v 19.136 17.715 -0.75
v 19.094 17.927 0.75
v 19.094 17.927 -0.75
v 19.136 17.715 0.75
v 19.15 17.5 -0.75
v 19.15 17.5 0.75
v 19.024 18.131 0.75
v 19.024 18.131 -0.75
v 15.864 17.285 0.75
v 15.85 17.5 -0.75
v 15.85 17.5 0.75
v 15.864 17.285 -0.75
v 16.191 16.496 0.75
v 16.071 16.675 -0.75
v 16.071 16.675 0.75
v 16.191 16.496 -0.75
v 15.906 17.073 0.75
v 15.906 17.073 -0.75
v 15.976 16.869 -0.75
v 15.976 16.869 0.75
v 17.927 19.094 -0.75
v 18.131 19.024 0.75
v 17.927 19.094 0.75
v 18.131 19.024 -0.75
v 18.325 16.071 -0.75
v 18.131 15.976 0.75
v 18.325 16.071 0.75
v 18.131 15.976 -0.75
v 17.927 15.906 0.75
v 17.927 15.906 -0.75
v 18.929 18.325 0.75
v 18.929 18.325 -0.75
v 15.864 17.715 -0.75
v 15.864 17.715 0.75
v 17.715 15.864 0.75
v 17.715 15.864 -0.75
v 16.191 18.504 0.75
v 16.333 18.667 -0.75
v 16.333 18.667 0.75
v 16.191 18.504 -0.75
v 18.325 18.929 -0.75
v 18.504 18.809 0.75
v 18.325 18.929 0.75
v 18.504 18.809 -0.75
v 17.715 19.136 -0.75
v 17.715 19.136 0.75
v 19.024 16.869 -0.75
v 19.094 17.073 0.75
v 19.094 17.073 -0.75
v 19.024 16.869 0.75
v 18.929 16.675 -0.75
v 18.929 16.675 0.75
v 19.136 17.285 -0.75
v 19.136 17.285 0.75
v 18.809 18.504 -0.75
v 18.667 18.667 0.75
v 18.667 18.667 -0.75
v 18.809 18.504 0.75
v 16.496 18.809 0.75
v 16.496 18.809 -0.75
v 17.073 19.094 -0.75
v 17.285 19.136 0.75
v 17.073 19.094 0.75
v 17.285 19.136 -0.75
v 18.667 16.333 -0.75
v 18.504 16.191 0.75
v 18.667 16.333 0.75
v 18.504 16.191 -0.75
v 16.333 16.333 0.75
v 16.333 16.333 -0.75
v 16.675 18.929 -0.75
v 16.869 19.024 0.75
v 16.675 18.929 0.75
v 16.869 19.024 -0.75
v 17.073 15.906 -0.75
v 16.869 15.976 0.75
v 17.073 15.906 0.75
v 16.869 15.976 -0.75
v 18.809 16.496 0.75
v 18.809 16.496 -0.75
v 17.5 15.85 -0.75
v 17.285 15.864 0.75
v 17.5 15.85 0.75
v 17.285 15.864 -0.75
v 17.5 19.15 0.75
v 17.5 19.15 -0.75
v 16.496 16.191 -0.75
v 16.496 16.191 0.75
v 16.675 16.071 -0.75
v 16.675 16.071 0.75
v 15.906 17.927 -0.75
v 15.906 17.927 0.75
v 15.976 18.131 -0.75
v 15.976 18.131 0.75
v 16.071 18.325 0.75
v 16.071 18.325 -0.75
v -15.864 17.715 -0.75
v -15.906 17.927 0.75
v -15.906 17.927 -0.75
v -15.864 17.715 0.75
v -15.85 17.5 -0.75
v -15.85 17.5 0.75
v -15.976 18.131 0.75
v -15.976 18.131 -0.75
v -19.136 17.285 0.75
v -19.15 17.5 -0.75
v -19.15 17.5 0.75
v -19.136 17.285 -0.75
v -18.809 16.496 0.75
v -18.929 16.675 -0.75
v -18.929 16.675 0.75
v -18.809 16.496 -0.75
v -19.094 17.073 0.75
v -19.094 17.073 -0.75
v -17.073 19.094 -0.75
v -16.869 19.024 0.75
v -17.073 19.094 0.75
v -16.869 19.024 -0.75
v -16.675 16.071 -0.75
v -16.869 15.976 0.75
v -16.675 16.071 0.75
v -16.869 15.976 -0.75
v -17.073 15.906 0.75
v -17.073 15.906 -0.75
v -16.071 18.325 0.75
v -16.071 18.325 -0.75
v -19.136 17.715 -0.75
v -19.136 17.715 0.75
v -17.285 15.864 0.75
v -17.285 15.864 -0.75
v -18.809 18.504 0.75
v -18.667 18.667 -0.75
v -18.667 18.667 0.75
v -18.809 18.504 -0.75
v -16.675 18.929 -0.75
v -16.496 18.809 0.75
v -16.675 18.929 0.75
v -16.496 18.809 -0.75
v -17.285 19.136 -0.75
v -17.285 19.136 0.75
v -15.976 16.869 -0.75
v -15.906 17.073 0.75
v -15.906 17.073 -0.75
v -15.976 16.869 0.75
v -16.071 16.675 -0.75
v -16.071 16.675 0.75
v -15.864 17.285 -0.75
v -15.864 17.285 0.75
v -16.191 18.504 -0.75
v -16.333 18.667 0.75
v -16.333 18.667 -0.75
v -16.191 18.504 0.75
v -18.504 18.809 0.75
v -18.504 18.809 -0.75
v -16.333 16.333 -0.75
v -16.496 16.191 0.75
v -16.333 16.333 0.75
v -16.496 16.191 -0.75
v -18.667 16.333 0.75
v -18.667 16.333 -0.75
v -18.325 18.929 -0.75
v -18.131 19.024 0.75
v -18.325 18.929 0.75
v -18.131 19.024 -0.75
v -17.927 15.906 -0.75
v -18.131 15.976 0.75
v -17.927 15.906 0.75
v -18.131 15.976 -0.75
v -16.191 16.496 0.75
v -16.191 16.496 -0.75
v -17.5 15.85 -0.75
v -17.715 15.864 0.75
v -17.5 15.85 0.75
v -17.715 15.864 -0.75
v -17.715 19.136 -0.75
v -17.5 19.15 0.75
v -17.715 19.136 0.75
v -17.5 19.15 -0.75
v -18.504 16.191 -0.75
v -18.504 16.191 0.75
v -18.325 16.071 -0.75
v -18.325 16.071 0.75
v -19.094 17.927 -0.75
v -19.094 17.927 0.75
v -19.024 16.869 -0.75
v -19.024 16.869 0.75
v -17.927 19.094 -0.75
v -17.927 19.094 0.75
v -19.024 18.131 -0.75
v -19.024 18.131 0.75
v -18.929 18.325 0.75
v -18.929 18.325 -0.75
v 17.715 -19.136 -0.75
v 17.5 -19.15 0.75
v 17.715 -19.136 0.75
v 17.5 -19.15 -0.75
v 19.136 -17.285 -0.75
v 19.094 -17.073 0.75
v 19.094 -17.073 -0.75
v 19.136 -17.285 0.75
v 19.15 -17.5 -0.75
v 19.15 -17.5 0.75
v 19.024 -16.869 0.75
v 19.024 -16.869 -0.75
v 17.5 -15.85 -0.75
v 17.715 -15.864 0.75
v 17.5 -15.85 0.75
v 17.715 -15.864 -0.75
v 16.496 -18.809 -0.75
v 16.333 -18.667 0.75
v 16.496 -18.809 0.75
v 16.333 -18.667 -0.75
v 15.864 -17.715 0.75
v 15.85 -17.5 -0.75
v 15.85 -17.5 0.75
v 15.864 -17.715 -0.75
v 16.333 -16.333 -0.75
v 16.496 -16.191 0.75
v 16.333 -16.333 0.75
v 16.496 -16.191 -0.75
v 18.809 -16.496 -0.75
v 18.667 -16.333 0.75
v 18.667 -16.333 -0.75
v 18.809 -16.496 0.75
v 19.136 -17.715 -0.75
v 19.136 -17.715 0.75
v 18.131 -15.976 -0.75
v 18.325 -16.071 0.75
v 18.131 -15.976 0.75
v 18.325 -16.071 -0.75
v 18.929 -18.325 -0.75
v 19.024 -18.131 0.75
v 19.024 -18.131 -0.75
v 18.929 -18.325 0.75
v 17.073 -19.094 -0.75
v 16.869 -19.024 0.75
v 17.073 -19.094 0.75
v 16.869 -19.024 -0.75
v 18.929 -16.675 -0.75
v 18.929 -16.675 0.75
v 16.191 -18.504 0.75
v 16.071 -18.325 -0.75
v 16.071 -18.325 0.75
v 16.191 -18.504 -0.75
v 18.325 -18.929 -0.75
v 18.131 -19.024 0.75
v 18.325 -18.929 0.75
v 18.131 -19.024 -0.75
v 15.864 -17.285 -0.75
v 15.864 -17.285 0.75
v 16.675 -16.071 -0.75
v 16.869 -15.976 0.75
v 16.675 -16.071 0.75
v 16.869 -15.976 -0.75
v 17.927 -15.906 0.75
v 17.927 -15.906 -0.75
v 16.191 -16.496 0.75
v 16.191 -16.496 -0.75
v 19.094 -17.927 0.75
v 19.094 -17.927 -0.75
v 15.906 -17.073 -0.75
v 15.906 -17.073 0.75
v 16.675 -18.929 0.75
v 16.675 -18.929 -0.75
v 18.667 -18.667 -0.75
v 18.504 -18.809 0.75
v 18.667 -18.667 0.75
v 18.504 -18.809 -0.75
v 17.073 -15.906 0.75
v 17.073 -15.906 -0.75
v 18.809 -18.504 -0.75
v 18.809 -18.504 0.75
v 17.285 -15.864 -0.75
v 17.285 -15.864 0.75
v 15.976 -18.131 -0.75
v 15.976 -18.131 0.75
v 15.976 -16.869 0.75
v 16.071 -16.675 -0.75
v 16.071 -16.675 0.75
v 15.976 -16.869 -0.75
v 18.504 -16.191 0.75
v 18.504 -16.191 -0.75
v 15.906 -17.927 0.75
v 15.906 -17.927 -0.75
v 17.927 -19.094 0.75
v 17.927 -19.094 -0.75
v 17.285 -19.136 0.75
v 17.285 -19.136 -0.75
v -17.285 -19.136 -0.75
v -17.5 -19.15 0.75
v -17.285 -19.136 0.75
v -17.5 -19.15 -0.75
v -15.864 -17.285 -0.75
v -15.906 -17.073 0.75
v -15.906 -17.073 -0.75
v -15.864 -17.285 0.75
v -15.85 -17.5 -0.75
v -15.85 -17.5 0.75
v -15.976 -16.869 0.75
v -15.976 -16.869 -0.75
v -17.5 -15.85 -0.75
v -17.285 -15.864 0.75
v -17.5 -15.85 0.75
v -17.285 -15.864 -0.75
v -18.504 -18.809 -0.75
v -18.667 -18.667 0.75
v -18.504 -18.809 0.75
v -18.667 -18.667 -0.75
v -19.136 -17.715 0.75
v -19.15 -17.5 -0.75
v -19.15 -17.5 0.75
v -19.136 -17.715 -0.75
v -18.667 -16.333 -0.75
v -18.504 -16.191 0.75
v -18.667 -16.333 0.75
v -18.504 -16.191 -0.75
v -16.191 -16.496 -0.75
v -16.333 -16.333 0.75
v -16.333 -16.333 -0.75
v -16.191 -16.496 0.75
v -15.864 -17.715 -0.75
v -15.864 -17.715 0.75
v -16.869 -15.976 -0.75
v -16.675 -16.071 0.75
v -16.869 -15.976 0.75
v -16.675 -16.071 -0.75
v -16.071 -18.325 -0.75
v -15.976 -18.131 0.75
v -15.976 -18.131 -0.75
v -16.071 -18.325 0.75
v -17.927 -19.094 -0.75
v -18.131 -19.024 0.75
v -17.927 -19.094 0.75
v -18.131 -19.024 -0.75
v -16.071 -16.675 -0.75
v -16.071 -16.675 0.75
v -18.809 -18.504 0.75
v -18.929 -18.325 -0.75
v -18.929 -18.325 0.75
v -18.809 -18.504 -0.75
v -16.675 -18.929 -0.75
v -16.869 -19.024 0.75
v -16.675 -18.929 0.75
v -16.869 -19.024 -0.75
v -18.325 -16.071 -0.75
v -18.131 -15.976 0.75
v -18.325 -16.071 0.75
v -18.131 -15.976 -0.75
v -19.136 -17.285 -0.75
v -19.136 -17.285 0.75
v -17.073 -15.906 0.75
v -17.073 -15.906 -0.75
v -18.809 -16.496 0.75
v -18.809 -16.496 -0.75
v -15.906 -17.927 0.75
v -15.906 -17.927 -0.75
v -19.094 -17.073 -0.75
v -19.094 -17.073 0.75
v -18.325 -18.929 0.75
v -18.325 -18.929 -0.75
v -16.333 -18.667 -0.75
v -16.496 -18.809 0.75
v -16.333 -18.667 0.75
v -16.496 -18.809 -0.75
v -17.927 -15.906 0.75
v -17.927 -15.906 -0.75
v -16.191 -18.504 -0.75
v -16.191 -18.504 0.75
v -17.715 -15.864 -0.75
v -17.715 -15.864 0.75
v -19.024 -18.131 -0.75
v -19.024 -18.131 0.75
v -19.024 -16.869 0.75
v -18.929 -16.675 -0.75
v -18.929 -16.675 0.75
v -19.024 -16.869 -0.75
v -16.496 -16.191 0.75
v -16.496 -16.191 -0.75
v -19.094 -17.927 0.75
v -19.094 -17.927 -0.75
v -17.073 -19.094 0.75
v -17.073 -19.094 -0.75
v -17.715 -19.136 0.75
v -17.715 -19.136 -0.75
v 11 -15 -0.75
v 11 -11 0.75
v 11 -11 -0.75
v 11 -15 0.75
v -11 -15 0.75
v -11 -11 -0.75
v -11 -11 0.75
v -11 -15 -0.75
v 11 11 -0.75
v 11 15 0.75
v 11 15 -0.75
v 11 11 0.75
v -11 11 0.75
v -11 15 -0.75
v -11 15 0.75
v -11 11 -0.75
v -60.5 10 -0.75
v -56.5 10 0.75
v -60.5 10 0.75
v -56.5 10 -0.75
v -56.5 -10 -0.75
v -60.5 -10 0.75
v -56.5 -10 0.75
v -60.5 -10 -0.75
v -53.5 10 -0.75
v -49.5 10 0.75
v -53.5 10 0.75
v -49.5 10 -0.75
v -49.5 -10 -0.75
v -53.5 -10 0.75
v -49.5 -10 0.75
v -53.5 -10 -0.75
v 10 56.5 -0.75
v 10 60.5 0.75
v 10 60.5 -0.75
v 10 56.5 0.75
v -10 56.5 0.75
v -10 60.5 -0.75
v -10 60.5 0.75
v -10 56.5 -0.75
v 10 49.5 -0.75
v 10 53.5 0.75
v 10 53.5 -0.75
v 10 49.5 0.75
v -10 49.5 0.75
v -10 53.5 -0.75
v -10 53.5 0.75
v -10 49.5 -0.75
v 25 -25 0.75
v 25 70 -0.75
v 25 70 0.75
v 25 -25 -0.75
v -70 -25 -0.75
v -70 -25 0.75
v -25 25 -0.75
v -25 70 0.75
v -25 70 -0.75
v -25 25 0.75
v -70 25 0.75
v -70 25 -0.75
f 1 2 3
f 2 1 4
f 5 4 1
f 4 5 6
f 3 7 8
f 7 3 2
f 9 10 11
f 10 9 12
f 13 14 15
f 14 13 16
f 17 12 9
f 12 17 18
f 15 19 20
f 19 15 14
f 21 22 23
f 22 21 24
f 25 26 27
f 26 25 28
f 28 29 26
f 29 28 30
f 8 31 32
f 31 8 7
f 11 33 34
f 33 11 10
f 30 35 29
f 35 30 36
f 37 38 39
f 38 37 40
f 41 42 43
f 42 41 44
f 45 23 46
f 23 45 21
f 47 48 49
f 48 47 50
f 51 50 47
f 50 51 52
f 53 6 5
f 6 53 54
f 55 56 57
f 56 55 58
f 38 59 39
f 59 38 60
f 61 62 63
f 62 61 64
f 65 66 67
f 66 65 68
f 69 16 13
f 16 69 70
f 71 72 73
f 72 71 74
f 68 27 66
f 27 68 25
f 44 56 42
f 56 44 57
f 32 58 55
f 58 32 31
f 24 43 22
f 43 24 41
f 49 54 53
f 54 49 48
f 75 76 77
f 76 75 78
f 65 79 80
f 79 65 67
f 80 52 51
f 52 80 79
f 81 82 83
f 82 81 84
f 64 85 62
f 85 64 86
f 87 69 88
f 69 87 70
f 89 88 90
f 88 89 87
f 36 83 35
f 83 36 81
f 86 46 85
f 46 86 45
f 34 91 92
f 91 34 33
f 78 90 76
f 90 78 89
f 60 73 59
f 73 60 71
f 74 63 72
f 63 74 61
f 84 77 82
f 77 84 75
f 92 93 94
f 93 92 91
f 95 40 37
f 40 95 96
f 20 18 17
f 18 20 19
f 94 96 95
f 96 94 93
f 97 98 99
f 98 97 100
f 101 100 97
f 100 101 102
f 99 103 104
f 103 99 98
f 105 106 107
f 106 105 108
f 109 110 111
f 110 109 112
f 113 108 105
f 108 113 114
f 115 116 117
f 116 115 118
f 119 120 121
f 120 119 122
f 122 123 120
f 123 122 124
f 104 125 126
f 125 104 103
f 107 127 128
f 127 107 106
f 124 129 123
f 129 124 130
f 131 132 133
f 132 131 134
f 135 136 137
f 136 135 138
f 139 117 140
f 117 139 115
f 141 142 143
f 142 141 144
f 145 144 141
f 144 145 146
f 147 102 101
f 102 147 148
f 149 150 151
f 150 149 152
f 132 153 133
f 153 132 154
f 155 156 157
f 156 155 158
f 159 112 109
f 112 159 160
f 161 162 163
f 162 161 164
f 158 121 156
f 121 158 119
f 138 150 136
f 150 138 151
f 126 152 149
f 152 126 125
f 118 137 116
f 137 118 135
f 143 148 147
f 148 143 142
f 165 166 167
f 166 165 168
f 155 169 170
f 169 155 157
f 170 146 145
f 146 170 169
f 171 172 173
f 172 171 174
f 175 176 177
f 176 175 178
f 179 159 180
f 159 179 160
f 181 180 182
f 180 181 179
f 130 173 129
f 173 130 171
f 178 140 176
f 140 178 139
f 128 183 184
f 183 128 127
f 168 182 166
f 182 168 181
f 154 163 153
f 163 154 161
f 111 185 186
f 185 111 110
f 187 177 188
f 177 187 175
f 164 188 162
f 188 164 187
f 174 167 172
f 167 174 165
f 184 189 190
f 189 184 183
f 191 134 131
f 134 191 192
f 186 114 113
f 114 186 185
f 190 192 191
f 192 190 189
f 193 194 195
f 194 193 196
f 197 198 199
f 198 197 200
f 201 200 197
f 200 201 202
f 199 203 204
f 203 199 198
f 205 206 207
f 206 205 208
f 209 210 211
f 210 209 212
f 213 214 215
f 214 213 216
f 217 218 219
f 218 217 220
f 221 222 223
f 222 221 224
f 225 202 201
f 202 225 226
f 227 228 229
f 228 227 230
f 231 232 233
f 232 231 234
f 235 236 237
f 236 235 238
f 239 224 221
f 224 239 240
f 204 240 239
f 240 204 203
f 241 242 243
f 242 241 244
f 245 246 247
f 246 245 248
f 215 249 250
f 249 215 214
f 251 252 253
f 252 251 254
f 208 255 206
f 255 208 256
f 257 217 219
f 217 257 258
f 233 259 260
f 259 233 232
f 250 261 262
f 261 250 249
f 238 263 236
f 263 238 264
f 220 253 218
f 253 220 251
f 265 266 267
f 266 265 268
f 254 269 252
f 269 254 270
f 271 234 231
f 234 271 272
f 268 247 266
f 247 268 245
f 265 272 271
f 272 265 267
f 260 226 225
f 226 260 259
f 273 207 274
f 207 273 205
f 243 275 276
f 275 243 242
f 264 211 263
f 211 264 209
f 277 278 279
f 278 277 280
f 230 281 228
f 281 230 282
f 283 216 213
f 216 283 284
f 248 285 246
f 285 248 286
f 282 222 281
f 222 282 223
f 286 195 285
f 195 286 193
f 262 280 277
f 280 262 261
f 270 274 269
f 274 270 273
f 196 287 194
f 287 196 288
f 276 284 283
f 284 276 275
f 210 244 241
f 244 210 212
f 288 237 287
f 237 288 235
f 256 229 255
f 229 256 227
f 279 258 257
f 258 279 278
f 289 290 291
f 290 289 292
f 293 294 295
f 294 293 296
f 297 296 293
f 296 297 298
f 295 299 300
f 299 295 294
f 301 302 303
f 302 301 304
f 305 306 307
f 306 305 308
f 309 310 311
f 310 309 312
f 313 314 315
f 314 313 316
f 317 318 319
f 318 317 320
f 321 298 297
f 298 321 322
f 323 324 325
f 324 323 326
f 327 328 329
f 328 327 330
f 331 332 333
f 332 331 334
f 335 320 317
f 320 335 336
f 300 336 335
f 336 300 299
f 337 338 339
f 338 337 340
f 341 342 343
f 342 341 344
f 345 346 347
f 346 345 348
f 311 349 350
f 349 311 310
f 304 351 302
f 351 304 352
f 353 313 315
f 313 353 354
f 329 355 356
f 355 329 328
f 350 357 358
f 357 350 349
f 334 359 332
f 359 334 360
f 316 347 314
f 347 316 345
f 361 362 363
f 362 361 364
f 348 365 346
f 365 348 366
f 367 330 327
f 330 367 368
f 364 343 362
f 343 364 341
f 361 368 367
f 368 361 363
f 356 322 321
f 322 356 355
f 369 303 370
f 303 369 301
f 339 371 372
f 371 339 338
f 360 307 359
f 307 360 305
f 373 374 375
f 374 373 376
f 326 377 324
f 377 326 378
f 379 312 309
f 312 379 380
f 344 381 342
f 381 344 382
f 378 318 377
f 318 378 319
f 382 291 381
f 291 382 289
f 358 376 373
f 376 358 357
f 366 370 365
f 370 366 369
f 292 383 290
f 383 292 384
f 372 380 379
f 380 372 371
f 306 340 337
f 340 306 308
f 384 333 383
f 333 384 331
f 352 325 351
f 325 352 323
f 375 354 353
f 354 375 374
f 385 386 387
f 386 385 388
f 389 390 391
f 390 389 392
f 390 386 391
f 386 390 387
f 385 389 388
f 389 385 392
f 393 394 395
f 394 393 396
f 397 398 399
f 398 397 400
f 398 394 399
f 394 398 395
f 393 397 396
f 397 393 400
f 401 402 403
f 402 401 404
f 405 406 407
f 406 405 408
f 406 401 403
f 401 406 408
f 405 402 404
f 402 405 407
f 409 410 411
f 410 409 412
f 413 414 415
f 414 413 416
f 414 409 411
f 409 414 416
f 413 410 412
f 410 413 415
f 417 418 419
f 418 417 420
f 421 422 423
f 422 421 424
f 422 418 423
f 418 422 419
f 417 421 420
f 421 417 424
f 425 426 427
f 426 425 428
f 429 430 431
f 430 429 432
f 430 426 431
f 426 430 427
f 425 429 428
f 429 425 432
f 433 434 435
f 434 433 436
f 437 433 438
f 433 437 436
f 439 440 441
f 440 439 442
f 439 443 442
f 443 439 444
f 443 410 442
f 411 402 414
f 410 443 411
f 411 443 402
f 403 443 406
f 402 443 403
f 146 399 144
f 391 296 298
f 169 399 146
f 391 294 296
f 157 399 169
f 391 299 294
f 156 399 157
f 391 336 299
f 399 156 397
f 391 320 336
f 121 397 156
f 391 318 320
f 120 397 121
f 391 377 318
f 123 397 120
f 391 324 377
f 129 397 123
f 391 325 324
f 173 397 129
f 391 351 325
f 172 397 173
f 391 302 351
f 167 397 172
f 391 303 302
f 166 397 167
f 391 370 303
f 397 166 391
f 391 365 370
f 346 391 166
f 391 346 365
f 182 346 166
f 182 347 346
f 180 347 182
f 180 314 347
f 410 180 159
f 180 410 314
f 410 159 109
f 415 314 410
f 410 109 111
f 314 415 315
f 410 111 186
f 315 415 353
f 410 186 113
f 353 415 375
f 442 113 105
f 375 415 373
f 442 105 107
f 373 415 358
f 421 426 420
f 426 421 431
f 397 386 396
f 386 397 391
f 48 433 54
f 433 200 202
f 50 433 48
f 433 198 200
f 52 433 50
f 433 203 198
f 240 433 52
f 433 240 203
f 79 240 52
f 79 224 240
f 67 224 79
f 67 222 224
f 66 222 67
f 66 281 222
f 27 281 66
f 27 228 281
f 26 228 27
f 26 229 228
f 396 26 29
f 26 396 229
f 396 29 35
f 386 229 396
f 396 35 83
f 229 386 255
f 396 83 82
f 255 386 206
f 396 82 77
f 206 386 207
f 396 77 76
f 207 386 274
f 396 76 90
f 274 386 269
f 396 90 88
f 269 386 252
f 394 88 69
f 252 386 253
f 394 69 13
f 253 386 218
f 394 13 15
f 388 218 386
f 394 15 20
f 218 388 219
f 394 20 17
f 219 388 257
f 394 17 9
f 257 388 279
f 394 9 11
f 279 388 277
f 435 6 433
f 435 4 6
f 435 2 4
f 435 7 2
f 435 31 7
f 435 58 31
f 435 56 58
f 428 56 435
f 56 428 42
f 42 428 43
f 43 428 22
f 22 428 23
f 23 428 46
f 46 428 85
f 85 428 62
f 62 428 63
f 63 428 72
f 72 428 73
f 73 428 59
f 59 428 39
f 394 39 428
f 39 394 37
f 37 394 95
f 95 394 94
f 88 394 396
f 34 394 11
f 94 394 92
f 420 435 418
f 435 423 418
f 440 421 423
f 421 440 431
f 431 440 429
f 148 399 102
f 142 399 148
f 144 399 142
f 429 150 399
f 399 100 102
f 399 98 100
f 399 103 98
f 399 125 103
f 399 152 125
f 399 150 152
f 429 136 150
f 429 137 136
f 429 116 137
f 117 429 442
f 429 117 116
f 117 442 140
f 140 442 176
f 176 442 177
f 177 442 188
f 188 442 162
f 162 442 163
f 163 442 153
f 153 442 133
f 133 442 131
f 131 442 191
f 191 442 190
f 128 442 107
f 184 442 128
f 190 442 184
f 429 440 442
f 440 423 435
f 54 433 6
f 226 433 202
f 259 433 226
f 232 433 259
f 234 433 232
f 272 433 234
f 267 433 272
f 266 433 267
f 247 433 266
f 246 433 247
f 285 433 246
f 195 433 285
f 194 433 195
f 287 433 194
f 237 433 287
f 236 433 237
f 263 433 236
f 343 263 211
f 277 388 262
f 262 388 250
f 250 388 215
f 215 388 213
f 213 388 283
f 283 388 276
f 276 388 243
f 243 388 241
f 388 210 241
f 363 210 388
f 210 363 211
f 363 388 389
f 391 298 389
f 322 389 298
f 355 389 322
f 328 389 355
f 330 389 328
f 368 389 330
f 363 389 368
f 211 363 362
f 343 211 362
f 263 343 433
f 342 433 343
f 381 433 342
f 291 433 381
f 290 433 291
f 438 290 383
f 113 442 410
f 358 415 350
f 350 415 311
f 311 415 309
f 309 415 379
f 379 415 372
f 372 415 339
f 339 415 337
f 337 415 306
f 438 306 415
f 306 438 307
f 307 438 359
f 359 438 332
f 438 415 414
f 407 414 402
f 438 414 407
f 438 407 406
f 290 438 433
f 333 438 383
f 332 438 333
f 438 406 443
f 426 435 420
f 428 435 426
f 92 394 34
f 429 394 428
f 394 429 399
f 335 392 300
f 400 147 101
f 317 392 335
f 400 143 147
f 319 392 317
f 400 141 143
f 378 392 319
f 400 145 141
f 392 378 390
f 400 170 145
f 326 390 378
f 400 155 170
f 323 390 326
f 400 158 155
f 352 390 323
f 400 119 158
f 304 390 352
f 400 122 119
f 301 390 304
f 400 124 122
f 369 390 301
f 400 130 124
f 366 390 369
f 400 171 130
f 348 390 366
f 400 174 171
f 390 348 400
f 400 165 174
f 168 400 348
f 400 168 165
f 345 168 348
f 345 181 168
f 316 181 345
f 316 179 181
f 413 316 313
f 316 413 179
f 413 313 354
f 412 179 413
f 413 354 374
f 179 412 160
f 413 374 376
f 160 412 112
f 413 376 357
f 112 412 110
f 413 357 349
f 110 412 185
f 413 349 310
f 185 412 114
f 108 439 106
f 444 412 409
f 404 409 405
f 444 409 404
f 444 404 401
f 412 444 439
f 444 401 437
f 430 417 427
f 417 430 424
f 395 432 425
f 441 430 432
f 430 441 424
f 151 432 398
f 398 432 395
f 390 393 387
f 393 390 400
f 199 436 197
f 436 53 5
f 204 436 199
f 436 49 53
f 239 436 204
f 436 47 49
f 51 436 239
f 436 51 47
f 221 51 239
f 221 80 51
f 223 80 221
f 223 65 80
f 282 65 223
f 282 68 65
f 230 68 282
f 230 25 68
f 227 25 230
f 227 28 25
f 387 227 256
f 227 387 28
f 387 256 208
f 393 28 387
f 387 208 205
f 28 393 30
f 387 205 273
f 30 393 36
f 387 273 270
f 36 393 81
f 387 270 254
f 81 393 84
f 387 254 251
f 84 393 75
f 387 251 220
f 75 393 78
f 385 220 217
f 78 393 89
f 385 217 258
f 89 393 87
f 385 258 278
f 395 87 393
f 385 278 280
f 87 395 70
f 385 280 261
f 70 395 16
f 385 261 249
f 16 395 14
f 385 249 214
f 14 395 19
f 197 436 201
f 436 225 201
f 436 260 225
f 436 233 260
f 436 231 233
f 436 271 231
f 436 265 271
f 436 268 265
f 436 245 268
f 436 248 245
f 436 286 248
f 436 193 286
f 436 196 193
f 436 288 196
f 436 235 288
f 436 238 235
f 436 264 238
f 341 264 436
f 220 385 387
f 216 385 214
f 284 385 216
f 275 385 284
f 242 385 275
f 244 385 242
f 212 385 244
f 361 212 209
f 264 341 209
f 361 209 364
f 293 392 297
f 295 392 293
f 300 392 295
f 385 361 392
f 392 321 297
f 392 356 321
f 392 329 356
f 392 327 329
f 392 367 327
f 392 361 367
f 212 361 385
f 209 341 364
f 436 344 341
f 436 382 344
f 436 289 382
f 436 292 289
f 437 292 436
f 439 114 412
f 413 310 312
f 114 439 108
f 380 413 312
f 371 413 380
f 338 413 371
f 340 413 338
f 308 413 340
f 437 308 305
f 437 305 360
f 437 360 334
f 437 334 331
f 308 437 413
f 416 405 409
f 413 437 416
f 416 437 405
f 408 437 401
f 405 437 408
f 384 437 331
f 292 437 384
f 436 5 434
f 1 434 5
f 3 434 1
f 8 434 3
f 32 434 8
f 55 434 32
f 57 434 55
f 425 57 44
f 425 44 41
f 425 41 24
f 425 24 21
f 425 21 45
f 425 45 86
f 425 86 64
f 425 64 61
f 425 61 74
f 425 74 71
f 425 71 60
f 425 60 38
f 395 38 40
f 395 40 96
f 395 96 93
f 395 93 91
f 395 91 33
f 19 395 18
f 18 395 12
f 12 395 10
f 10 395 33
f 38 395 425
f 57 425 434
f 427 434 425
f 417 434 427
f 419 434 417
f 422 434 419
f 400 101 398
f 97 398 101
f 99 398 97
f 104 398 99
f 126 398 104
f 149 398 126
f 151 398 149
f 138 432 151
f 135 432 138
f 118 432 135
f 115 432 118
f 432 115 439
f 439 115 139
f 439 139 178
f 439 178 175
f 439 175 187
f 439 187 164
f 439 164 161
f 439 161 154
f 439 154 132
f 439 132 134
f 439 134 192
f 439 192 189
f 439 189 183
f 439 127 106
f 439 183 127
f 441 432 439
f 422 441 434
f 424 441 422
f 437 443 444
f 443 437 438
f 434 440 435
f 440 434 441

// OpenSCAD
//
// RP4TD Zip-Tie Plate (minimal)
// Flat plate with angled slot pairs for two antennas
// Loop-free, explicit placement
// B Dog — quad-001
//

//--------------------
// USER PARAMETERS
//--------------------
plate_size            = [140, 140];  // [X,Y] mm overall platform
plate_thickness       = 3.0;        // mm

// Frame mounting holes (enable/disable)
enable_frame_rect     = true;
frame_rect_spacing    = [35, 35];   // [X,Y] mm center-to-center spacing
hole_diameter         = 3.3;        // mm (M3 clearance)

// Receiver tie-downs (centered front/back)
add_rx_tie_slots      = true;
rx_slot_w             = 4.0;        // mm
rx_slot_l             = 22.0;       // mm
rx_slot_spacing_y     = 26.0;       // mm between the two slots (front/back)

// Antenna slot geometry (per antenna: 2 slots in parallel)
ant_slot_w            = 4.0;        // mm (zip tie width + clearance)
ant_slot_l            = 20.0;       // mm
ant_slot_gap          = 7.0;        // mm between the two parallel slots

// Antenna slot positions/angles
// X offsets from center so the two antennas are left/right
ant_offset_x          = 0.0;  //12.0;       // mm from center to each antenna slot pair
// Y offset forward/aft of FC center (+Y forward, -Y aft)
ant_offset_y          = 55.0;       // mm along the long axis

// Angles are standard OpenSCAD Z-rotations (0° = along +X, 90° = along +Y)
// Pick any pair that gives you good diversity (e.g., 45° & 90°)
left_slot_angle_deg   = 90;         // left antenna (CCW from +X)
right_slot_angle_deg  = 0;          // right antenna (0° points outboard to +X)

// Visual smoothness for rounded ends (if you add fillets later)
$fn = 48;

infinity = 500;
cornerDistance = 70;

makeItAnLShapeDistance = 25;

//--------------------
// MAIN
//--------------------
module zip_plate() {
  difference() {
    // Plate
    translate([0,0,0])
      cube([plate_size[0], plate_size[1], plate_thickness/2], center=true);

    // Frame holes
    if (enable_frame_rect)
      mount_holes_rect_explicit(frame_rect_spacing, hole_diameter);

    // Receiver tie slots (front/back, centered in X)
    if (add_rx_tie_slots)
      rx_tie_slots_explicit();

    // Antenna slots (LEFT & RIGHT), each is a pair of parallel slots

    // LEFT (negative X)
    antenna_slot_pair(
      pos = [ ant_offset_x, ant_offset_y, 0.0],
      slot_l = ant_slot_l,
      slot_w = ant_slot_w,
      gap    = ant_slot_gap,
      angle_deg = left_slot_angle_deg
    );

    // RIGHT (positive X)
    antenna_slot_pair(
      pos = [  ant_offset_x, ant_offset_y, 0.0 ],
      slot_l = ant_slot_l,
      slot_w = ant_slot_w,
      gap    = ant_slot_gap,
      angle_deg = right_slot_angle_deg
    );

    // cut corners of cube to make an octagon    
    //cut_corners(cornerDistance);
    
    // honeycomb with circular pattern
    //honeycomb_holes(plate_size, 6, 10, plate_thickness);

    makeItAnLShape(makeItAnLShapeDistance);
  }
}

zip_plate();

//--------------------
// CUT FEATURES
//--------------------
module mount_holes_rect_explicit(spacing, d) {
  translate([ +spacing[0]/2, +spacing[1]/2, -plate_thickness / 2]) hole(d);
  translate([ -spacing[0]/2, +spacing[1]/2, -plate_thickness / 2]) hole(d);
  translate([ +spacing[0]/2, -spacing[1]/2, -plate_thickness / 2]) hole(d);
  translate([ -spacing[0]/2, -spacing[1]/2, -plate_thickness / 2]) hole(d);
}

module hole(d) {
  cylinder(h = plate_thickness, r = d/2, center=false);
}

module rx_tie_slots_explicit() {
  // Back slot
  translate([0, -rx_slot_spacing_y/2, 0.0])
    cube([rx_slot_l, rx_slot_w, plate_thickness + 0.6], center=true);
  // Front slot
  translate([0,  rx_slot_spacing_y/2, 0.0])
    cube([rx_slot_l, rx_slot_w, plate_thickness + 0.6], center=true);
}

// A pair of parallel slots used to zip-tie an antenna in place at an angle
// pos = center of the slot pair on the plate surface
// angle_deg = rotation about Z (0°=+X, 90°=+Y)
module antenna_slot_pair(pos=[0,0,0], slot_l=20, slot_w=4, gap=7, angle_deg=45) {
  
  // We cut two long rectangles separated by 'gap', both rotated by angle_deg.
  // The pair center sits at 'pos'. Slots are aligned along 'slot_l'.
  // Direction vector perpendicular to slot length for spacing the two slots:
  // We rotate a unit vector by angle+90 to offset each slot half-gap.
  rotate([0,0,angle_deg]) {
    // After rotation, slots are along +X; gap is applied along +Y
    translate([pos[0], pos[1], pos[2]]) {
      // Upper slot
      translate([0, +gap/2, 0])
        cube([slot_l, slot_w, plate_thickness + 0.6], center=true);

      // Lower slot
      translate([0, -gap/2, 0])
        cube([slot_l, slot_w, plate_thickness + 0.6], center=true);
    }
  }
}

module cut_corners(distance) {
   rotate([0, 0, 45]){
       translate([distance, -infinity/2, -plate_thickness/2]) {
           cube([infinity, infinity, infinity], false);
       }
   }
   rotate([0, 0, 135]){
       translate([distance, -infinity/2, -plate_thickness/2]) {
           cube([infinity, infinity, infinity], false);
       }
   }
   rotate([0, 0, 225]){
       translate([distance, -infinity/2, -plate_thickness/2]) {
           cube([infinity, infinity, infinity], false);
       }
   }
   rotate([0, 0, 315]){
       translate([distance, -infinity/2, -plate_thickness/2]) {
           cube([infinity, infinity, infinity], false);
       }
   }   
}

// Generate honeycomb holes
module honeycomb_holes(size=[100,60], d=6, spacing=10, h=3) {
  cols = ceil(size[0]/spacing) + 2;
  rows = ceil(size[1]/(spacing*0.866)) + 2; // 0.866 = sqrt(3)/2
  for (r = [0:rows-1]) {
    y = (r - rows/2) * spacing * 0.866;
    x_shift = (r % 2 == 0) ? 0 : spacing/2;
    for (c = [0:cols-1]) {
      x = (c - cols/2) * spacing + x_shift;
      translate([x, y, -h/2])
        cylinder(h=h, d=d, center=false);
    }
  }
}

module makeItAnLShape(d) {
    // make it an l shape
    translate([d, -infinity/2, -plate_thickness/2]){
      cube([infinity, infinity, plate_thickness], false);
    }

    translate([-infinity /2, -infinity-d, -plate_thickness/2]){
      cube([infinity, infinity, plate_thickness], false);
    }
    
    translate([-d-infinity, d, -plate_thickness/2]) {
      cube([infinity, infinity, plate_thickness], false);
    }
}
